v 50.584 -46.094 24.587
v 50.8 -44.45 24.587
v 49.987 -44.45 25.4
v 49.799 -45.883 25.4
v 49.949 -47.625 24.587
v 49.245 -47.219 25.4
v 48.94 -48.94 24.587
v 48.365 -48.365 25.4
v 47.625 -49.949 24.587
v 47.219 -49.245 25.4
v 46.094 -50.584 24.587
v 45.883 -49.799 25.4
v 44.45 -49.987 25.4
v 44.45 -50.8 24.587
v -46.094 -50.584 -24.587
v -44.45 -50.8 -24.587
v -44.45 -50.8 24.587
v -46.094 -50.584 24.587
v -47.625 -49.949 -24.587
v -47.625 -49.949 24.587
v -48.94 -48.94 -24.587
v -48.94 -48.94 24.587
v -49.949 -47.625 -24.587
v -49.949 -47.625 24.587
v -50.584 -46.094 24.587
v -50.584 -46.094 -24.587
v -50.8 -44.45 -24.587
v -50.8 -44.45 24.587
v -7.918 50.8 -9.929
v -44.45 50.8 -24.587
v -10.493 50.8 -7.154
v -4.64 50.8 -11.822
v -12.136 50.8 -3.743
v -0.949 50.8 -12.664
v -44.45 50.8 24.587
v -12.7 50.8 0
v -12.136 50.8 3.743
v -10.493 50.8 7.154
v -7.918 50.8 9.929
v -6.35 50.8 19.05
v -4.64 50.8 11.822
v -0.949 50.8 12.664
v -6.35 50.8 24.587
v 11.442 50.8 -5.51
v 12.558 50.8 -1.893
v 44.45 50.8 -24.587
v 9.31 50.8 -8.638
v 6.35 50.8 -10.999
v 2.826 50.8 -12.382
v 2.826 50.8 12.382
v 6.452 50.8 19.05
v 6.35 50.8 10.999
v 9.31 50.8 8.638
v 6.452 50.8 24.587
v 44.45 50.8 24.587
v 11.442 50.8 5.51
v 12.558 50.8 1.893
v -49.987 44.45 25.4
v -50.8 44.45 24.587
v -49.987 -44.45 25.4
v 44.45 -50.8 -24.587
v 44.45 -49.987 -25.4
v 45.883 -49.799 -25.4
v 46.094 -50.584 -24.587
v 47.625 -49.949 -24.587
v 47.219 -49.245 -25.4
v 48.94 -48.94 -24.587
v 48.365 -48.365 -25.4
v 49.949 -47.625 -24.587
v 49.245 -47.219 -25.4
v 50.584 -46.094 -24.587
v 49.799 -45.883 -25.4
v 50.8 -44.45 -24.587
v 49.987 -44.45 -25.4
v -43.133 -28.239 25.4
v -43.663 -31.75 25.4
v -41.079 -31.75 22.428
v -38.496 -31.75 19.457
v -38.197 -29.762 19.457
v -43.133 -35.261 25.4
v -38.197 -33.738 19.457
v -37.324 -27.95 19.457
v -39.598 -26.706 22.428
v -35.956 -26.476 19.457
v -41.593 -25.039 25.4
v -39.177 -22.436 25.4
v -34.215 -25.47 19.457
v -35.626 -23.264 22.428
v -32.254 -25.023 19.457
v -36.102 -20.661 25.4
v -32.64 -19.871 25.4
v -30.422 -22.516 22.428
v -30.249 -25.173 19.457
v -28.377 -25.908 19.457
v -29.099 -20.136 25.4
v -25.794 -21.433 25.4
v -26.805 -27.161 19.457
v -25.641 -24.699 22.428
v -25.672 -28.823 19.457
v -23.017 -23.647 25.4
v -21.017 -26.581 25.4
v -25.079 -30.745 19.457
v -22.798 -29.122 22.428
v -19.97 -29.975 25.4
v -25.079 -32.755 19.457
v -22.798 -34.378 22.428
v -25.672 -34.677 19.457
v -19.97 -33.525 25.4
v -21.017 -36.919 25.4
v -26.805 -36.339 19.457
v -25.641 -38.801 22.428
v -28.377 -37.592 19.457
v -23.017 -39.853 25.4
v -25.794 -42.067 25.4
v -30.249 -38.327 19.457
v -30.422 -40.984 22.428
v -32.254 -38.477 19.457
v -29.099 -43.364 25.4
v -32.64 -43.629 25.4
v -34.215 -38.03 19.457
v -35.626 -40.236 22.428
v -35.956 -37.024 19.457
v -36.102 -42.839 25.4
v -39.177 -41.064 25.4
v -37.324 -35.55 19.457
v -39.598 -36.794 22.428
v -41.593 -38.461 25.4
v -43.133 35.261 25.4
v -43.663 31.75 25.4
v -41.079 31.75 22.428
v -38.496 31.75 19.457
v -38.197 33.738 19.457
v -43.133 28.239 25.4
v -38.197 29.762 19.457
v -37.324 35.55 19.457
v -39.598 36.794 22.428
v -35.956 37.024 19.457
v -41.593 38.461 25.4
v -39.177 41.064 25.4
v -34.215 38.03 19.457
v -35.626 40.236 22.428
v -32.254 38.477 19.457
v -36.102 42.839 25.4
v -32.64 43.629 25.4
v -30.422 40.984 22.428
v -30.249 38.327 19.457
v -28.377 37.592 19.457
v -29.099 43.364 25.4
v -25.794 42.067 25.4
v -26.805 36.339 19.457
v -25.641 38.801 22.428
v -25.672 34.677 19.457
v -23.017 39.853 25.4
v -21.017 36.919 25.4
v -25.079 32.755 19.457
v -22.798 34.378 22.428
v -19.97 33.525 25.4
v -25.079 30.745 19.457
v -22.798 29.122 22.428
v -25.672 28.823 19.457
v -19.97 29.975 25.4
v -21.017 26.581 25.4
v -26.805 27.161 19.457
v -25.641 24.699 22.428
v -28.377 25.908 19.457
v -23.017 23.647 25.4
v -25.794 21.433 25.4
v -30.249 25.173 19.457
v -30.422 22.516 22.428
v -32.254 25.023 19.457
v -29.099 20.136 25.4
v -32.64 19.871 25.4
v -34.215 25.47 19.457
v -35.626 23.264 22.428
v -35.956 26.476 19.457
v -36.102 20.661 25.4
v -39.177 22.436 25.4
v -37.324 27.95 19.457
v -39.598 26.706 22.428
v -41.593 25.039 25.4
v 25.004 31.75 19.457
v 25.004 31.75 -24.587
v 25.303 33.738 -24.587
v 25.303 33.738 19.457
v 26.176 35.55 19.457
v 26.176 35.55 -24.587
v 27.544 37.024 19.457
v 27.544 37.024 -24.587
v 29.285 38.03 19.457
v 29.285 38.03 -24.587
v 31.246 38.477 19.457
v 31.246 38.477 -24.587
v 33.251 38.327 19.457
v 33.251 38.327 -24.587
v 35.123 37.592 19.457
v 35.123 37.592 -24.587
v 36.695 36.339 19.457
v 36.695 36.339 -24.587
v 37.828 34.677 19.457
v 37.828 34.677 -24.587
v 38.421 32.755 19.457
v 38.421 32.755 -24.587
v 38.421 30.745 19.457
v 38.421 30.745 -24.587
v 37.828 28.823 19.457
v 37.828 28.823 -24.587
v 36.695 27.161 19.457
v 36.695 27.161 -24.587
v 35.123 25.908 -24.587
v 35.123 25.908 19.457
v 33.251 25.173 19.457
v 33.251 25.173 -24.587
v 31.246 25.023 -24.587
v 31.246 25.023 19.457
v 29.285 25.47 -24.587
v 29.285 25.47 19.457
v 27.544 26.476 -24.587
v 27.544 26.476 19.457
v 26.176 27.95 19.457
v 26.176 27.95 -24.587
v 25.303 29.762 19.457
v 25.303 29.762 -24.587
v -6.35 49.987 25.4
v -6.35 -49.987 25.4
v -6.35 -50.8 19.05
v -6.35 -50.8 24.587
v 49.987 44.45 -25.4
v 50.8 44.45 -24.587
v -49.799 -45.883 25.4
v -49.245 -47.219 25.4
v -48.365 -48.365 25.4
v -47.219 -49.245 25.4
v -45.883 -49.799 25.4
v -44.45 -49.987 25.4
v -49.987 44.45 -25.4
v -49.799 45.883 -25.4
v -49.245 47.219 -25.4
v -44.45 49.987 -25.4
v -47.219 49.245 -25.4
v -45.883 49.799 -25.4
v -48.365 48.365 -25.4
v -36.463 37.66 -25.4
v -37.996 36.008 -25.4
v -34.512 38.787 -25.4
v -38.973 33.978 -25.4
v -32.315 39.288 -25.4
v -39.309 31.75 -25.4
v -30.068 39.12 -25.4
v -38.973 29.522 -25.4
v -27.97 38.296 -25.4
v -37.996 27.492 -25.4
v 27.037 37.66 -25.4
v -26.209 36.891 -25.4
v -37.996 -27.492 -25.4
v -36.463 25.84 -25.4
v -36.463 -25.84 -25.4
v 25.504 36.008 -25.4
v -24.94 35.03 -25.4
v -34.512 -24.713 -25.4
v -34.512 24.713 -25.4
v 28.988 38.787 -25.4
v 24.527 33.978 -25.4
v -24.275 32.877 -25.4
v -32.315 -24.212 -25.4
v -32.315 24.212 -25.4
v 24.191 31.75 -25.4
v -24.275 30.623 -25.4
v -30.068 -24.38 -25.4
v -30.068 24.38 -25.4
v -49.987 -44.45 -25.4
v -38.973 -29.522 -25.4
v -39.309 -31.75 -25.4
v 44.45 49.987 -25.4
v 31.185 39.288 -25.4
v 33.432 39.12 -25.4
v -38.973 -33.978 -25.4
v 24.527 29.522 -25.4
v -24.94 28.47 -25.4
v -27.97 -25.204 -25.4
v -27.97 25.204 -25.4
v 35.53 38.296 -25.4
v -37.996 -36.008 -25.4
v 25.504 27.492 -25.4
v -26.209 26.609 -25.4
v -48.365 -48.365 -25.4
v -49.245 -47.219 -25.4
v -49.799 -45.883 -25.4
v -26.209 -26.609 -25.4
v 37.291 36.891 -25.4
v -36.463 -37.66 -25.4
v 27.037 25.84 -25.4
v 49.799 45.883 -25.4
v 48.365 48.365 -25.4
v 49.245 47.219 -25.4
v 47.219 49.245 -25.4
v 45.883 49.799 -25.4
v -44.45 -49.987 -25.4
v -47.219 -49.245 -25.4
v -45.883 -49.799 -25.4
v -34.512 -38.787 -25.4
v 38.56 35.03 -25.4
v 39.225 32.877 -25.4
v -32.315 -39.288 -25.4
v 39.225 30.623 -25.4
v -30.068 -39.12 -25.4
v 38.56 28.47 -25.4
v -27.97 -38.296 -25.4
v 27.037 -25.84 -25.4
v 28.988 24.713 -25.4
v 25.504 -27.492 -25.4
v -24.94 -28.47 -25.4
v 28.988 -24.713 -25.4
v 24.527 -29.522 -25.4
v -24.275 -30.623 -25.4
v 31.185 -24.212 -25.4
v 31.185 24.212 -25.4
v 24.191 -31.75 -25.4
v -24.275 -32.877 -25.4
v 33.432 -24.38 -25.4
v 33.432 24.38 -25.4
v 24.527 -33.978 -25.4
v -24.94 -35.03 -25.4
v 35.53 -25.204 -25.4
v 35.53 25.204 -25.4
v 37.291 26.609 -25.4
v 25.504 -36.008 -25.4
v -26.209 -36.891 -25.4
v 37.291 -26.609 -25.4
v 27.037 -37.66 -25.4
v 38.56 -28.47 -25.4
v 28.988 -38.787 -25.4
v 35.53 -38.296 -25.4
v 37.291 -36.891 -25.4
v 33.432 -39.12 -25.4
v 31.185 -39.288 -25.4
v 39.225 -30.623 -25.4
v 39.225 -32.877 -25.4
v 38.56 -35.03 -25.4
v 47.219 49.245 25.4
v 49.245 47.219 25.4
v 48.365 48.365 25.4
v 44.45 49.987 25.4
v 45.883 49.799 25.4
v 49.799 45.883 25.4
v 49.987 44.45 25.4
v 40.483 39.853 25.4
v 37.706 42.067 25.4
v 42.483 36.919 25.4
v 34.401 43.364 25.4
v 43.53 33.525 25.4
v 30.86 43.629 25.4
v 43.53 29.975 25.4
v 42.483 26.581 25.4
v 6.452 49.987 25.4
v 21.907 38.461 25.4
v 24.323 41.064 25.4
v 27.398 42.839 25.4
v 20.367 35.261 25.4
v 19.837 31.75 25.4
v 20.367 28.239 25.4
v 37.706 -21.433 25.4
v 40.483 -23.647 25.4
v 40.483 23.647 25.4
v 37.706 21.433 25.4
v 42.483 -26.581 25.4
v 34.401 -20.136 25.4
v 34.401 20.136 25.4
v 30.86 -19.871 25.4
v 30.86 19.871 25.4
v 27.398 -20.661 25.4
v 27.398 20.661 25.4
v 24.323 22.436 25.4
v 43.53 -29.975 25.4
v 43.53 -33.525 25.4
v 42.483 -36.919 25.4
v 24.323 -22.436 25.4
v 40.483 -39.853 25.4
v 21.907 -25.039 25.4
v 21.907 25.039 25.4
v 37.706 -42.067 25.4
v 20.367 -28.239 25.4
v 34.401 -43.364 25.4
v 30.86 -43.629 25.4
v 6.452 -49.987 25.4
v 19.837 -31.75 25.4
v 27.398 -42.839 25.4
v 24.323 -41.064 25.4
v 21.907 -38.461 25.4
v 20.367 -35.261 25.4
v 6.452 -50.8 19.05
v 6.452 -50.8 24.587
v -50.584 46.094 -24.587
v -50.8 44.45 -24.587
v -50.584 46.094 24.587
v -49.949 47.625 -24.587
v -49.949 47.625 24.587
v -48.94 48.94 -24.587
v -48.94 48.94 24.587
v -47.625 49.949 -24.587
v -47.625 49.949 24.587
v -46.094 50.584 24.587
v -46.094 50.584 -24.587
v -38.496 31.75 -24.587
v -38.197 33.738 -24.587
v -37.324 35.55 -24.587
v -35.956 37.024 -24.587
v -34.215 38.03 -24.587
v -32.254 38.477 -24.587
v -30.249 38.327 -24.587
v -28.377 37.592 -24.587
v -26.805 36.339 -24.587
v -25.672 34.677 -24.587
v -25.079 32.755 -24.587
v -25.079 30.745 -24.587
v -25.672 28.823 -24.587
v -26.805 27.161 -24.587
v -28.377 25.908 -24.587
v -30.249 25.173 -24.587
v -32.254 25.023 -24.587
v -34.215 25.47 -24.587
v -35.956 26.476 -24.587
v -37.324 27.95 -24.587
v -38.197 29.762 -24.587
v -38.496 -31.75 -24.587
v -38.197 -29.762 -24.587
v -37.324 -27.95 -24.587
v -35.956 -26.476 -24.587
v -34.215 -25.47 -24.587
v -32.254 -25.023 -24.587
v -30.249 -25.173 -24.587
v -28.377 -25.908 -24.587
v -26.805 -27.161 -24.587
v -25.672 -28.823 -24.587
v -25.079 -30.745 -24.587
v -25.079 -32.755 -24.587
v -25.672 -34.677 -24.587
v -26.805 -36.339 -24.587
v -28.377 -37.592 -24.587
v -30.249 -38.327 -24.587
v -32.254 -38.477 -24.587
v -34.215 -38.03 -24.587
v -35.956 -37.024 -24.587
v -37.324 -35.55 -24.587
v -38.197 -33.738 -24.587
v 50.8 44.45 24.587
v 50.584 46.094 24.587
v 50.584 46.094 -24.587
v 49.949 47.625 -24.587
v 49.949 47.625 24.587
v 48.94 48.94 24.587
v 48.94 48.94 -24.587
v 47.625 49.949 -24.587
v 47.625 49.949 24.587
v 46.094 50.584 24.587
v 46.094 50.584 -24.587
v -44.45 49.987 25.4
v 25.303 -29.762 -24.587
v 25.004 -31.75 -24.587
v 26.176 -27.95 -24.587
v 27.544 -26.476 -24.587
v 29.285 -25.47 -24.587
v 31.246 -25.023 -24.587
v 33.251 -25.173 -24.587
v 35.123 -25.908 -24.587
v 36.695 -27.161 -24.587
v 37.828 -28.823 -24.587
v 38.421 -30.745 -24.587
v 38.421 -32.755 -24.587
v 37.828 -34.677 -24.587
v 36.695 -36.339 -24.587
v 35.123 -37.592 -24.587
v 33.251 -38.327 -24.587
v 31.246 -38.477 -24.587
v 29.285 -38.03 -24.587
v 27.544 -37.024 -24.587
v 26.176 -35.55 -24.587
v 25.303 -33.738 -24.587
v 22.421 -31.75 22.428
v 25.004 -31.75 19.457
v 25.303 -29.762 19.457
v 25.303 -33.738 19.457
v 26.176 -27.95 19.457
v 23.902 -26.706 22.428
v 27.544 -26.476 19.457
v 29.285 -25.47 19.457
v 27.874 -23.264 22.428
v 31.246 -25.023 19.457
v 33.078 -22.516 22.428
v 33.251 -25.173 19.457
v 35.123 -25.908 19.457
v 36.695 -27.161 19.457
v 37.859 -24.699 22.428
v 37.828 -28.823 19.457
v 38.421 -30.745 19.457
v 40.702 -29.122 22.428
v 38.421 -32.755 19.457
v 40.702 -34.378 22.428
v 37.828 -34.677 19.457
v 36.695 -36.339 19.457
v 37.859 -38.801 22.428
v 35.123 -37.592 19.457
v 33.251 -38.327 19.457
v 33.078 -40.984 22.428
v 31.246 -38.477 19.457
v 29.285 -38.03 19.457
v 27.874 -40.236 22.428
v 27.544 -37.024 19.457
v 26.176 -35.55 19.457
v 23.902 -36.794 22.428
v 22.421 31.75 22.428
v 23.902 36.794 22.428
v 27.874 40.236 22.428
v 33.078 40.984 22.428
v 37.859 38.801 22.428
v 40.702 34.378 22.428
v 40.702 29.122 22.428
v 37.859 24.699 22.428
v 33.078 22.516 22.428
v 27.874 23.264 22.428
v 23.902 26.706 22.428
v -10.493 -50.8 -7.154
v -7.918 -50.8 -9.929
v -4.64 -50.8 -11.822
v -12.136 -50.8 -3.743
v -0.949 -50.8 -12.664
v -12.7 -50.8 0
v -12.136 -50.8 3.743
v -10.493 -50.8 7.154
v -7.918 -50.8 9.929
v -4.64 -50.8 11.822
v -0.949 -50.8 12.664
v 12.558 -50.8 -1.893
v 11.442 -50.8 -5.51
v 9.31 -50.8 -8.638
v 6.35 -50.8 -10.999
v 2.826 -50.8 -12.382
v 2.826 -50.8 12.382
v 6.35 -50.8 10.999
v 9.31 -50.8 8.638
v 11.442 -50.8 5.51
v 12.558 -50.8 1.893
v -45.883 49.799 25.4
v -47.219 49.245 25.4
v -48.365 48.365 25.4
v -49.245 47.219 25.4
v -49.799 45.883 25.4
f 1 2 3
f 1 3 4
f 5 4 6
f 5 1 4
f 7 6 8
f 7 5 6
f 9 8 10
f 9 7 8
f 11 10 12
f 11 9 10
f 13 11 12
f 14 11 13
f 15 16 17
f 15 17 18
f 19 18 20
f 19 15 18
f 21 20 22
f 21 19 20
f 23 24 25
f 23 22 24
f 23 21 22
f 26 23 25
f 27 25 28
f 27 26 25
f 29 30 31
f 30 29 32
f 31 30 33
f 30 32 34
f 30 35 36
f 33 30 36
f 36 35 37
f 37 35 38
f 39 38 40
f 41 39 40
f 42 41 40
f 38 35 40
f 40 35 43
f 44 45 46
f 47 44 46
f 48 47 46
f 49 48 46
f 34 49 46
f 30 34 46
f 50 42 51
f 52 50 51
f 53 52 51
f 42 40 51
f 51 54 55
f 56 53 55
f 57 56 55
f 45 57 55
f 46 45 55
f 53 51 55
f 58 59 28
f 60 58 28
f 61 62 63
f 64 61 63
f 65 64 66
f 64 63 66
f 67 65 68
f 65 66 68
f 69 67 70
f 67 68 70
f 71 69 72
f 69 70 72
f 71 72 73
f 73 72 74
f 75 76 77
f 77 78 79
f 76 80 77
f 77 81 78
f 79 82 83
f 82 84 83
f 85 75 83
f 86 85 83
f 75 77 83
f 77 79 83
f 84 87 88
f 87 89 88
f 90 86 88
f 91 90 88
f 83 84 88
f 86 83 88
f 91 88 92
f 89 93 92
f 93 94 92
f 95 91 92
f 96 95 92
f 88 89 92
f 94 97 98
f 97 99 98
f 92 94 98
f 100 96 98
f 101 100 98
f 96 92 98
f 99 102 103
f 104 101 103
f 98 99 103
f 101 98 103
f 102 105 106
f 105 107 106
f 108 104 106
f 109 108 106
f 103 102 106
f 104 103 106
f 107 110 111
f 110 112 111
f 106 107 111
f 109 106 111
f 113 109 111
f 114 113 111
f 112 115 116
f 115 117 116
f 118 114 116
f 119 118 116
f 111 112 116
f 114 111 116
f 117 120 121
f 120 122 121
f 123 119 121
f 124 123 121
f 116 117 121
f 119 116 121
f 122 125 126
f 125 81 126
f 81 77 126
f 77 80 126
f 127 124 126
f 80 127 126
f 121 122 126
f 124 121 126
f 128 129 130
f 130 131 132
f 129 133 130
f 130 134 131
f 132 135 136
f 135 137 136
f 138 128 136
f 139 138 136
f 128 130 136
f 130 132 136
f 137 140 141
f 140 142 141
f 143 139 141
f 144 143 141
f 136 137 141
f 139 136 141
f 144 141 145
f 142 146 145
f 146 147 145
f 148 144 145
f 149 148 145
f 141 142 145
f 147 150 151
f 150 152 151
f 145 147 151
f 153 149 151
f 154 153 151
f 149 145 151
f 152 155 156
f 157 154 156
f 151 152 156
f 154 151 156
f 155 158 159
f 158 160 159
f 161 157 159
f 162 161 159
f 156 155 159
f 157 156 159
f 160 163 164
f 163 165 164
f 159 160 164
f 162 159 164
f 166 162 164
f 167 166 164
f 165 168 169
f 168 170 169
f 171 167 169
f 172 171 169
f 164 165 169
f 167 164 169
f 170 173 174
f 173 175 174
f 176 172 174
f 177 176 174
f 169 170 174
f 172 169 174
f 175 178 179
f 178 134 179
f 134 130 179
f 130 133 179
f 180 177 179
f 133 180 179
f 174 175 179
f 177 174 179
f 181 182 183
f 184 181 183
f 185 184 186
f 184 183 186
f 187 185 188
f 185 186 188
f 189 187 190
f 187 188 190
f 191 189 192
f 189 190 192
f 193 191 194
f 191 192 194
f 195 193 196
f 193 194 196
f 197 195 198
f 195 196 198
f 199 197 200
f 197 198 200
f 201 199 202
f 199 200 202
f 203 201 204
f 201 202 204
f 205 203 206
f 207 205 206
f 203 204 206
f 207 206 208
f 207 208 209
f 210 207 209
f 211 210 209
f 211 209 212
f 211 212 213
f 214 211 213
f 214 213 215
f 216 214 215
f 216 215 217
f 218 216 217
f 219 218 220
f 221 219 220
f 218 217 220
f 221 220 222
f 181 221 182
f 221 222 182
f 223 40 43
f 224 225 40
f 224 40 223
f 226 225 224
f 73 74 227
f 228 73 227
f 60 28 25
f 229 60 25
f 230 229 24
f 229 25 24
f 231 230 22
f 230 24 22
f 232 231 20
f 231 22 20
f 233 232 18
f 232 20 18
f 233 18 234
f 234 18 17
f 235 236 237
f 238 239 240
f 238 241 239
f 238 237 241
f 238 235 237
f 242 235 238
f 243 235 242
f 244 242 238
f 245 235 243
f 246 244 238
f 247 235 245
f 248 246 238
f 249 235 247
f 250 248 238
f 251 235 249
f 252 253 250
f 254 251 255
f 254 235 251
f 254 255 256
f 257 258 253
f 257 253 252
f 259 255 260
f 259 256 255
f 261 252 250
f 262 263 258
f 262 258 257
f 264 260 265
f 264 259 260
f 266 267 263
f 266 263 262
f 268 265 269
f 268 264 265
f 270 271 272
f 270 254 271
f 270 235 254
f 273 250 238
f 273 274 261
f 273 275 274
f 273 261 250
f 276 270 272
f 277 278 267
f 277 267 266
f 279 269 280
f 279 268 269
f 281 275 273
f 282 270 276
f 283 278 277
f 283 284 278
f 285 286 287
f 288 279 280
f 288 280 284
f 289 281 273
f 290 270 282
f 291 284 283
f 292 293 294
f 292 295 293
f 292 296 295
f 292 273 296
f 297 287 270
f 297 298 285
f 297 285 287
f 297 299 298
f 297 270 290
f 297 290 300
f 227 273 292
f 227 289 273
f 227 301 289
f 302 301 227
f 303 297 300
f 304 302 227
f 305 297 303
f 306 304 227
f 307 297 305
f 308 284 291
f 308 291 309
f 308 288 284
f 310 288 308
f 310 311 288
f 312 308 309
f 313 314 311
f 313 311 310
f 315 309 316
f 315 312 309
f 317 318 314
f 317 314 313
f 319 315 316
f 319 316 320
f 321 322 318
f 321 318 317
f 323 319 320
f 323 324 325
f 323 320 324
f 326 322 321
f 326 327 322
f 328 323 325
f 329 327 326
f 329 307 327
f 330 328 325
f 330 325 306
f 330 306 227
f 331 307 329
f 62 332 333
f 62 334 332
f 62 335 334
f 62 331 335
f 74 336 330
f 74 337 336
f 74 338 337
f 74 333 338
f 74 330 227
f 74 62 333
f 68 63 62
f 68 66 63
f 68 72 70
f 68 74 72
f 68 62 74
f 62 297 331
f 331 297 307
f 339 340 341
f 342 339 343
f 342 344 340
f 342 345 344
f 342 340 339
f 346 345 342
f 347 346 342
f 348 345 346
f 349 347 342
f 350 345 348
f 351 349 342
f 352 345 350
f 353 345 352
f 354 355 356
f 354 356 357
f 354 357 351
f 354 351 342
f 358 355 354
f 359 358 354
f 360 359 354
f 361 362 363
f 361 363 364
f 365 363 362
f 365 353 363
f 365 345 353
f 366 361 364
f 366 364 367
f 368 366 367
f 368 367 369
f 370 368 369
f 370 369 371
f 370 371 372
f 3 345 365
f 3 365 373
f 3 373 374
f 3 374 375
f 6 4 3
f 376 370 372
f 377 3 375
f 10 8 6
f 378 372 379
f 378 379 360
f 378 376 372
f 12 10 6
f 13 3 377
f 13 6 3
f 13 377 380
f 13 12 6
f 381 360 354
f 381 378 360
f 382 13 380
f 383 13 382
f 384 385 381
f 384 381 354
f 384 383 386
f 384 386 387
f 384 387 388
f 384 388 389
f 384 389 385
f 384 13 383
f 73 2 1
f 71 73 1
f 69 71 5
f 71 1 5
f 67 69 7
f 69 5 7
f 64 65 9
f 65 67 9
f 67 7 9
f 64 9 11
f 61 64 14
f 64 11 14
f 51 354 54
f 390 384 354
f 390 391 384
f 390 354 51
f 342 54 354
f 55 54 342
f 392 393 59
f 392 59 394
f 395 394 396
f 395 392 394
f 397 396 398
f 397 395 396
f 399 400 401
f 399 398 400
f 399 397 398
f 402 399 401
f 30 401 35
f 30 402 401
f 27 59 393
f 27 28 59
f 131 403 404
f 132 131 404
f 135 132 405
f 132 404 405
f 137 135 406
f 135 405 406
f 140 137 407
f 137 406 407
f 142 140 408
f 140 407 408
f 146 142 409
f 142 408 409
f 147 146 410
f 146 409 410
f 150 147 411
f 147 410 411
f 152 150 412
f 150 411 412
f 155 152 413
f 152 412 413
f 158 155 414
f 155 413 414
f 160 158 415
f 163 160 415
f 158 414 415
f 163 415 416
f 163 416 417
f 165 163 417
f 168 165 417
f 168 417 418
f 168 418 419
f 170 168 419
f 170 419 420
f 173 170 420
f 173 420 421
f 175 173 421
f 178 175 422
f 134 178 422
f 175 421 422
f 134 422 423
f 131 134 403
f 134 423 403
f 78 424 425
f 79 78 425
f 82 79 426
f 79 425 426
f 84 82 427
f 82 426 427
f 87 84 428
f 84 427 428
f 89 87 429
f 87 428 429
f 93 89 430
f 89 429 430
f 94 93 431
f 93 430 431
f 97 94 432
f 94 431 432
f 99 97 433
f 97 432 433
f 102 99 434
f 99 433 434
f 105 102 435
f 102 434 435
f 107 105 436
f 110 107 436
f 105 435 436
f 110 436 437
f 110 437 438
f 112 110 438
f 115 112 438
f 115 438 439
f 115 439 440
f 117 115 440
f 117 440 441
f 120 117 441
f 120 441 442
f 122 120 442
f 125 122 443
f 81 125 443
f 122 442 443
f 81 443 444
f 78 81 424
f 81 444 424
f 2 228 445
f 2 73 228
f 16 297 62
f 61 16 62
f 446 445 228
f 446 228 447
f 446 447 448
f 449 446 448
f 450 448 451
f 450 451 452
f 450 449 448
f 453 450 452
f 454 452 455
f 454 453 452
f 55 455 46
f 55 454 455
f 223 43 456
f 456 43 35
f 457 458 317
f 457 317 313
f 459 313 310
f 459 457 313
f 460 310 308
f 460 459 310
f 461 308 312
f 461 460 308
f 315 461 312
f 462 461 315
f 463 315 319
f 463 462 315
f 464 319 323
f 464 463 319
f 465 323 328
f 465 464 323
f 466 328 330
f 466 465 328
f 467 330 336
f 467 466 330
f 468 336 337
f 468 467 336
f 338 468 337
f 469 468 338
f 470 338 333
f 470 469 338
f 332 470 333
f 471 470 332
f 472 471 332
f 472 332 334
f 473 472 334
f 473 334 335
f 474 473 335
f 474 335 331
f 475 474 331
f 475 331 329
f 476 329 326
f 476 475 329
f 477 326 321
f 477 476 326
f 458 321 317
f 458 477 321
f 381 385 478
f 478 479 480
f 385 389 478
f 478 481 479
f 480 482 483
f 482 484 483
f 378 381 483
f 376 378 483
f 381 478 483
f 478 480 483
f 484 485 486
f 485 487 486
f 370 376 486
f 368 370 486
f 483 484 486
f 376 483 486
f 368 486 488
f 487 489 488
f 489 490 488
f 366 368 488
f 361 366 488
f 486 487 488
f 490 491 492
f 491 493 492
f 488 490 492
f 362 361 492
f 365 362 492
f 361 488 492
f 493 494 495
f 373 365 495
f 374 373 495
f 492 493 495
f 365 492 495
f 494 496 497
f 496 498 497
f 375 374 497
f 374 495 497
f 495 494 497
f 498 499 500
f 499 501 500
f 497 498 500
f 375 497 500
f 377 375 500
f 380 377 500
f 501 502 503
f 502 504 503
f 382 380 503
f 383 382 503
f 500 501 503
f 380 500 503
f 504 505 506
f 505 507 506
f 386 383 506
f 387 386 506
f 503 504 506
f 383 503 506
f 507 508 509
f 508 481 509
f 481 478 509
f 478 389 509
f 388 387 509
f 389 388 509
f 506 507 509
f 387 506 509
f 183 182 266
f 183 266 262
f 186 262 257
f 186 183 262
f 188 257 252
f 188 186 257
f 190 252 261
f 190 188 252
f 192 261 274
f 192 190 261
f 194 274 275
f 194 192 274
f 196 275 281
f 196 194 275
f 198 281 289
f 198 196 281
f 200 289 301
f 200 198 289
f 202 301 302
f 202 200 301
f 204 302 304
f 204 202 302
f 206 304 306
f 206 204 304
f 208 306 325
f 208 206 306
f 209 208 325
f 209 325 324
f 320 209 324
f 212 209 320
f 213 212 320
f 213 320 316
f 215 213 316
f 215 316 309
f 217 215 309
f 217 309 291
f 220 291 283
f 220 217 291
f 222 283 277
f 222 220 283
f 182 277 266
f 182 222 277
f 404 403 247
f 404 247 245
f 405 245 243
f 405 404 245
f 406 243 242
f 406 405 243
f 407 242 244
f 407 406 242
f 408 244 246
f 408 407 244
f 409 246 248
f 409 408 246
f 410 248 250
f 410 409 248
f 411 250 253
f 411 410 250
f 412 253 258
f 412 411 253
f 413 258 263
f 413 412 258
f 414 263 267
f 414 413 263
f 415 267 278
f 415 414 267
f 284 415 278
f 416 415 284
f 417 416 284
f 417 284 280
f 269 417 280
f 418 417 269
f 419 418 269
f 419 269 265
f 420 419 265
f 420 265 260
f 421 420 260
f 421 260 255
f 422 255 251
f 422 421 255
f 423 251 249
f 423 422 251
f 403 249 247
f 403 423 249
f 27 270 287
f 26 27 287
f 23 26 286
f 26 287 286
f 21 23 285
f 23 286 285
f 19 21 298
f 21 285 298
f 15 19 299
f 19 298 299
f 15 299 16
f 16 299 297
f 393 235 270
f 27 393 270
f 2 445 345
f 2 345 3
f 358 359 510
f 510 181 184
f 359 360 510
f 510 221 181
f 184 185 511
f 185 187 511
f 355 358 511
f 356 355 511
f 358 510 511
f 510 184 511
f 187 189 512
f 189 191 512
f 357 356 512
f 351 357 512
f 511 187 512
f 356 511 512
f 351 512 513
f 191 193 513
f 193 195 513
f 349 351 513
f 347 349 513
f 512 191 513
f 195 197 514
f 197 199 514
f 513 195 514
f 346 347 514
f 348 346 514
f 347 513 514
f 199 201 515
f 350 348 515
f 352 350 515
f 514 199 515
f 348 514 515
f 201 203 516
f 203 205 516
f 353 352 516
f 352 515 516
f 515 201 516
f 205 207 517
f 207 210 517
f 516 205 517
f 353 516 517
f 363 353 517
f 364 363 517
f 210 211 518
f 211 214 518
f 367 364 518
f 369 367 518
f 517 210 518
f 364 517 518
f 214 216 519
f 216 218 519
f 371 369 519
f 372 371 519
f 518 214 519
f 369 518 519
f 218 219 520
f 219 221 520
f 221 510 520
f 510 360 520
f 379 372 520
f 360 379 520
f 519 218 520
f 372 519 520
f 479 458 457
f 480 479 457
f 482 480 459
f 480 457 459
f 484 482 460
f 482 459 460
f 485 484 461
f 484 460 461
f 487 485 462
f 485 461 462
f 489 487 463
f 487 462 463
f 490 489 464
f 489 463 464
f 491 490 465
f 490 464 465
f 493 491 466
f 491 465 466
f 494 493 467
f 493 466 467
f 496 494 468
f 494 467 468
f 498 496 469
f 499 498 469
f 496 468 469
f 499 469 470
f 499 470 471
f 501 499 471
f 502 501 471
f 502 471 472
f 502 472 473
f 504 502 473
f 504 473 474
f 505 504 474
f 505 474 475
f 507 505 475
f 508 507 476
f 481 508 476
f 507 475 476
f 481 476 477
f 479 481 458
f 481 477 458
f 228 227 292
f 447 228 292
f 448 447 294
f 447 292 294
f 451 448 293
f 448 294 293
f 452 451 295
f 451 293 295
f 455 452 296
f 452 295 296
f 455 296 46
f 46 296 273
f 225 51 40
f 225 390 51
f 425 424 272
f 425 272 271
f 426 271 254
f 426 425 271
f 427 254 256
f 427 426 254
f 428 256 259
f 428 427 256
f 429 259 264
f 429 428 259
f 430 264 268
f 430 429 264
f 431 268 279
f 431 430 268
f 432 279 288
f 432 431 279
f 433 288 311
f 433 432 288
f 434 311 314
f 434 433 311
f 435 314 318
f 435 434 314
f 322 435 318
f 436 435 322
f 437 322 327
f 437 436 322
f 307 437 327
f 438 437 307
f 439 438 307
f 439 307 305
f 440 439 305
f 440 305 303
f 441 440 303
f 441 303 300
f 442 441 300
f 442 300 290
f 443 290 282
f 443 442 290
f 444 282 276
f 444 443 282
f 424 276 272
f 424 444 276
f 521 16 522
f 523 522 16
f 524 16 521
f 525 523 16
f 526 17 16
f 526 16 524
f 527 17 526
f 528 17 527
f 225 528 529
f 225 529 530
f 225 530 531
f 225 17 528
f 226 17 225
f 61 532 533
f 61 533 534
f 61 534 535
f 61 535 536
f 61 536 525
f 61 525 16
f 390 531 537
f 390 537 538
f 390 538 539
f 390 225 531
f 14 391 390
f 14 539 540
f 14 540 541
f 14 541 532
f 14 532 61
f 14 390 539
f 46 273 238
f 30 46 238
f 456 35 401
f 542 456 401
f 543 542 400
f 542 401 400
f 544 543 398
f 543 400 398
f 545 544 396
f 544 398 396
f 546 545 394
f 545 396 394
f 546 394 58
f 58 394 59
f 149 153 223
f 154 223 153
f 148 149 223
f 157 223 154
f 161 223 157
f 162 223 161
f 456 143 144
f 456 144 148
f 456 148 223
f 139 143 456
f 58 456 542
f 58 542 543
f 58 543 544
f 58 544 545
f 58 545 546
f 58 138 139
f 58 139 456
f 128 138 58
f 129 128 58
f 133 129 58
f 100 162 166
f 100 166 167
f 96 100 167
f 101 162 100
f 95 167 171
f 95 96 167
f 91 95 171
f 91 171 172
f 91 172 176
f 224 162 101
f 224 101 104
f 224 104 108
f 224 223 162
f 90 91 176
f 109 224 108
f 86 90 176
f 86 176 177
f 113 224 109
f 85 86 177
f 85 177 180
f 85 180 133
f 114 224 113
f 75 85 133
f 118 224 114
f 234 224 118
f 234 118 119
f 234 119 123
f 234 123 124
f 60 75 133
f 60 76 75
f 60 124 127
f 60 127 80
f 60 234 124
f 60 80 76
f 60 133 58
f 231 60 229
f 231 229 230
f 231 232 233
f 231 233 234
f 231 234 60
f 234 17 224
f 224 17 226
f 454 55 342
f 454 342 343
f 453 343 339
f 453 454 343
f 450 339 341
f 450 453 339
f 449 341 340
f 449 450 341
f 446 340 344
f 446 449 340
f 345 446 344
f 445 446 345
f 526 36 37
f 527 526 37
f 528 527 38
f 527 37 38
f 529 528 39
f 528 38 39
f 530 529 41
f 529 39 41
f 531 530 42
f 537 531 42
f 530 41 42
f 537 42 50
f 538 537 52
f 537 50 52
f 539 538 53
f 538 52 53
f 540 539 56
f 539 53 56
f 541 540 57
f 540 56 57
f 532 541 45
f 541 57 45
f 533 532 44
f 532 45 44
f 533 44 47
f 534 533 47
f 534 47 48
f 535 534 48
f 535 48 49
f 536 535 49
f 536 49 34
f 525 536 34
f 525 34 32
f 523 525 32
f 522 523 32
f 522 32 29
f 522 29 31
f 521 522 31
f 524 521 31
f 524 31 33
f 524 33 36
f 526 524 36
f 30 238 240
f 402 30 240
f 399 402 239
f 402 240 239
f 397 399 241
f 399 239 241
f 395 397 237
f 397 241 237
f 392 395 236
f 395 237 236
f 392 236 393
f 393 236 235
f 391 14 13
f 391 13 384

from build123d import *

# Parameters (mm, degrees)
F1_DEPTH       = 50.8
F3_D           = 13.49248
F3_CSINK_D     = 23.8252
F3_CSINK_ANGLE = 82
F4_R           = 6.35
F5_SIZE        = 0.8128
F7_D           = 25.4


with BuildPart() as f1:
    # F0 (on Front) → F1 (new body, symmetric)
    with BuildSketch(Plane.XZ):
        Polygon((-6.35, 25.4), (-50.8, 25.4), (-50.8, -25.4), (50.8, -25.4), (50.8, 25.4), (6.4515996888, 25.4), (6.4515996888, 19.05), (-6.35, 19.05), align=None)
    extrude(amount=F1_DEPTH, both=True)

    # F3 (through all)
    with Locations(Plane.XY.offset(25.4)):
        with Locations((-31.75, 31.75), (31.75, 31.75), (-31.75, -31.75), (31.75, -31.75)):
            CounterSinkHole(F3_D / 2, F3_CSINK_D / 2, counter_sink_angle=F3_CSINK_ANGLE)

    # F4
    f4_edges = [f1.edges().sort_by_distance(p)[0] for p in [
        (50.8, 50.8, 0),
        (50.8, -50.8, 0),
        (-50.8, -50.8, 0),
        (-50.8, 50.8, 0),
    ]]
    fillet(f4_edges, radius=F4_R)

    # F5
    f5_edges = [f1.edges().sort_by_distance(p)[0] for p in [
        (-50.8, 0, 25.4),
        (50.8, 0, 25.4),
        (-25.4, 50.8, 25.4),
        (25.4508, 50.8, 25.4),
        (-25.4, -50.8, 25.4),
        (25.4508, -50.8, 25.4),
        (-50.8, 0, -25.4),
        (-48.940128, 48.940128, -25.4),
        (-48.940128, -48.940128, -25.4),
        (0, 50.8, -25.4),
        (0, -50.8, -25.4),
        (48.940128, 48.940128, -25.4),
        (48.940128, -48.940128, -25.4),
        (50.8, 0, -25.4),
        (-38.49624, 31.75, -25.4),
        (25.00376, 31.75, -25.4),
        (-38.49624, -31.75, -25.4),
        (25.00376, -31.75, -25.4),
    ]]
    chamfer(f5_edges, length=F5_SIZE)

    # F7 (through all)
    with Locations(Plane.XZ.offset(50.8)):
        with Locations((0, 0)):
            Hole(F7_D / 2)


solid = f1.part
